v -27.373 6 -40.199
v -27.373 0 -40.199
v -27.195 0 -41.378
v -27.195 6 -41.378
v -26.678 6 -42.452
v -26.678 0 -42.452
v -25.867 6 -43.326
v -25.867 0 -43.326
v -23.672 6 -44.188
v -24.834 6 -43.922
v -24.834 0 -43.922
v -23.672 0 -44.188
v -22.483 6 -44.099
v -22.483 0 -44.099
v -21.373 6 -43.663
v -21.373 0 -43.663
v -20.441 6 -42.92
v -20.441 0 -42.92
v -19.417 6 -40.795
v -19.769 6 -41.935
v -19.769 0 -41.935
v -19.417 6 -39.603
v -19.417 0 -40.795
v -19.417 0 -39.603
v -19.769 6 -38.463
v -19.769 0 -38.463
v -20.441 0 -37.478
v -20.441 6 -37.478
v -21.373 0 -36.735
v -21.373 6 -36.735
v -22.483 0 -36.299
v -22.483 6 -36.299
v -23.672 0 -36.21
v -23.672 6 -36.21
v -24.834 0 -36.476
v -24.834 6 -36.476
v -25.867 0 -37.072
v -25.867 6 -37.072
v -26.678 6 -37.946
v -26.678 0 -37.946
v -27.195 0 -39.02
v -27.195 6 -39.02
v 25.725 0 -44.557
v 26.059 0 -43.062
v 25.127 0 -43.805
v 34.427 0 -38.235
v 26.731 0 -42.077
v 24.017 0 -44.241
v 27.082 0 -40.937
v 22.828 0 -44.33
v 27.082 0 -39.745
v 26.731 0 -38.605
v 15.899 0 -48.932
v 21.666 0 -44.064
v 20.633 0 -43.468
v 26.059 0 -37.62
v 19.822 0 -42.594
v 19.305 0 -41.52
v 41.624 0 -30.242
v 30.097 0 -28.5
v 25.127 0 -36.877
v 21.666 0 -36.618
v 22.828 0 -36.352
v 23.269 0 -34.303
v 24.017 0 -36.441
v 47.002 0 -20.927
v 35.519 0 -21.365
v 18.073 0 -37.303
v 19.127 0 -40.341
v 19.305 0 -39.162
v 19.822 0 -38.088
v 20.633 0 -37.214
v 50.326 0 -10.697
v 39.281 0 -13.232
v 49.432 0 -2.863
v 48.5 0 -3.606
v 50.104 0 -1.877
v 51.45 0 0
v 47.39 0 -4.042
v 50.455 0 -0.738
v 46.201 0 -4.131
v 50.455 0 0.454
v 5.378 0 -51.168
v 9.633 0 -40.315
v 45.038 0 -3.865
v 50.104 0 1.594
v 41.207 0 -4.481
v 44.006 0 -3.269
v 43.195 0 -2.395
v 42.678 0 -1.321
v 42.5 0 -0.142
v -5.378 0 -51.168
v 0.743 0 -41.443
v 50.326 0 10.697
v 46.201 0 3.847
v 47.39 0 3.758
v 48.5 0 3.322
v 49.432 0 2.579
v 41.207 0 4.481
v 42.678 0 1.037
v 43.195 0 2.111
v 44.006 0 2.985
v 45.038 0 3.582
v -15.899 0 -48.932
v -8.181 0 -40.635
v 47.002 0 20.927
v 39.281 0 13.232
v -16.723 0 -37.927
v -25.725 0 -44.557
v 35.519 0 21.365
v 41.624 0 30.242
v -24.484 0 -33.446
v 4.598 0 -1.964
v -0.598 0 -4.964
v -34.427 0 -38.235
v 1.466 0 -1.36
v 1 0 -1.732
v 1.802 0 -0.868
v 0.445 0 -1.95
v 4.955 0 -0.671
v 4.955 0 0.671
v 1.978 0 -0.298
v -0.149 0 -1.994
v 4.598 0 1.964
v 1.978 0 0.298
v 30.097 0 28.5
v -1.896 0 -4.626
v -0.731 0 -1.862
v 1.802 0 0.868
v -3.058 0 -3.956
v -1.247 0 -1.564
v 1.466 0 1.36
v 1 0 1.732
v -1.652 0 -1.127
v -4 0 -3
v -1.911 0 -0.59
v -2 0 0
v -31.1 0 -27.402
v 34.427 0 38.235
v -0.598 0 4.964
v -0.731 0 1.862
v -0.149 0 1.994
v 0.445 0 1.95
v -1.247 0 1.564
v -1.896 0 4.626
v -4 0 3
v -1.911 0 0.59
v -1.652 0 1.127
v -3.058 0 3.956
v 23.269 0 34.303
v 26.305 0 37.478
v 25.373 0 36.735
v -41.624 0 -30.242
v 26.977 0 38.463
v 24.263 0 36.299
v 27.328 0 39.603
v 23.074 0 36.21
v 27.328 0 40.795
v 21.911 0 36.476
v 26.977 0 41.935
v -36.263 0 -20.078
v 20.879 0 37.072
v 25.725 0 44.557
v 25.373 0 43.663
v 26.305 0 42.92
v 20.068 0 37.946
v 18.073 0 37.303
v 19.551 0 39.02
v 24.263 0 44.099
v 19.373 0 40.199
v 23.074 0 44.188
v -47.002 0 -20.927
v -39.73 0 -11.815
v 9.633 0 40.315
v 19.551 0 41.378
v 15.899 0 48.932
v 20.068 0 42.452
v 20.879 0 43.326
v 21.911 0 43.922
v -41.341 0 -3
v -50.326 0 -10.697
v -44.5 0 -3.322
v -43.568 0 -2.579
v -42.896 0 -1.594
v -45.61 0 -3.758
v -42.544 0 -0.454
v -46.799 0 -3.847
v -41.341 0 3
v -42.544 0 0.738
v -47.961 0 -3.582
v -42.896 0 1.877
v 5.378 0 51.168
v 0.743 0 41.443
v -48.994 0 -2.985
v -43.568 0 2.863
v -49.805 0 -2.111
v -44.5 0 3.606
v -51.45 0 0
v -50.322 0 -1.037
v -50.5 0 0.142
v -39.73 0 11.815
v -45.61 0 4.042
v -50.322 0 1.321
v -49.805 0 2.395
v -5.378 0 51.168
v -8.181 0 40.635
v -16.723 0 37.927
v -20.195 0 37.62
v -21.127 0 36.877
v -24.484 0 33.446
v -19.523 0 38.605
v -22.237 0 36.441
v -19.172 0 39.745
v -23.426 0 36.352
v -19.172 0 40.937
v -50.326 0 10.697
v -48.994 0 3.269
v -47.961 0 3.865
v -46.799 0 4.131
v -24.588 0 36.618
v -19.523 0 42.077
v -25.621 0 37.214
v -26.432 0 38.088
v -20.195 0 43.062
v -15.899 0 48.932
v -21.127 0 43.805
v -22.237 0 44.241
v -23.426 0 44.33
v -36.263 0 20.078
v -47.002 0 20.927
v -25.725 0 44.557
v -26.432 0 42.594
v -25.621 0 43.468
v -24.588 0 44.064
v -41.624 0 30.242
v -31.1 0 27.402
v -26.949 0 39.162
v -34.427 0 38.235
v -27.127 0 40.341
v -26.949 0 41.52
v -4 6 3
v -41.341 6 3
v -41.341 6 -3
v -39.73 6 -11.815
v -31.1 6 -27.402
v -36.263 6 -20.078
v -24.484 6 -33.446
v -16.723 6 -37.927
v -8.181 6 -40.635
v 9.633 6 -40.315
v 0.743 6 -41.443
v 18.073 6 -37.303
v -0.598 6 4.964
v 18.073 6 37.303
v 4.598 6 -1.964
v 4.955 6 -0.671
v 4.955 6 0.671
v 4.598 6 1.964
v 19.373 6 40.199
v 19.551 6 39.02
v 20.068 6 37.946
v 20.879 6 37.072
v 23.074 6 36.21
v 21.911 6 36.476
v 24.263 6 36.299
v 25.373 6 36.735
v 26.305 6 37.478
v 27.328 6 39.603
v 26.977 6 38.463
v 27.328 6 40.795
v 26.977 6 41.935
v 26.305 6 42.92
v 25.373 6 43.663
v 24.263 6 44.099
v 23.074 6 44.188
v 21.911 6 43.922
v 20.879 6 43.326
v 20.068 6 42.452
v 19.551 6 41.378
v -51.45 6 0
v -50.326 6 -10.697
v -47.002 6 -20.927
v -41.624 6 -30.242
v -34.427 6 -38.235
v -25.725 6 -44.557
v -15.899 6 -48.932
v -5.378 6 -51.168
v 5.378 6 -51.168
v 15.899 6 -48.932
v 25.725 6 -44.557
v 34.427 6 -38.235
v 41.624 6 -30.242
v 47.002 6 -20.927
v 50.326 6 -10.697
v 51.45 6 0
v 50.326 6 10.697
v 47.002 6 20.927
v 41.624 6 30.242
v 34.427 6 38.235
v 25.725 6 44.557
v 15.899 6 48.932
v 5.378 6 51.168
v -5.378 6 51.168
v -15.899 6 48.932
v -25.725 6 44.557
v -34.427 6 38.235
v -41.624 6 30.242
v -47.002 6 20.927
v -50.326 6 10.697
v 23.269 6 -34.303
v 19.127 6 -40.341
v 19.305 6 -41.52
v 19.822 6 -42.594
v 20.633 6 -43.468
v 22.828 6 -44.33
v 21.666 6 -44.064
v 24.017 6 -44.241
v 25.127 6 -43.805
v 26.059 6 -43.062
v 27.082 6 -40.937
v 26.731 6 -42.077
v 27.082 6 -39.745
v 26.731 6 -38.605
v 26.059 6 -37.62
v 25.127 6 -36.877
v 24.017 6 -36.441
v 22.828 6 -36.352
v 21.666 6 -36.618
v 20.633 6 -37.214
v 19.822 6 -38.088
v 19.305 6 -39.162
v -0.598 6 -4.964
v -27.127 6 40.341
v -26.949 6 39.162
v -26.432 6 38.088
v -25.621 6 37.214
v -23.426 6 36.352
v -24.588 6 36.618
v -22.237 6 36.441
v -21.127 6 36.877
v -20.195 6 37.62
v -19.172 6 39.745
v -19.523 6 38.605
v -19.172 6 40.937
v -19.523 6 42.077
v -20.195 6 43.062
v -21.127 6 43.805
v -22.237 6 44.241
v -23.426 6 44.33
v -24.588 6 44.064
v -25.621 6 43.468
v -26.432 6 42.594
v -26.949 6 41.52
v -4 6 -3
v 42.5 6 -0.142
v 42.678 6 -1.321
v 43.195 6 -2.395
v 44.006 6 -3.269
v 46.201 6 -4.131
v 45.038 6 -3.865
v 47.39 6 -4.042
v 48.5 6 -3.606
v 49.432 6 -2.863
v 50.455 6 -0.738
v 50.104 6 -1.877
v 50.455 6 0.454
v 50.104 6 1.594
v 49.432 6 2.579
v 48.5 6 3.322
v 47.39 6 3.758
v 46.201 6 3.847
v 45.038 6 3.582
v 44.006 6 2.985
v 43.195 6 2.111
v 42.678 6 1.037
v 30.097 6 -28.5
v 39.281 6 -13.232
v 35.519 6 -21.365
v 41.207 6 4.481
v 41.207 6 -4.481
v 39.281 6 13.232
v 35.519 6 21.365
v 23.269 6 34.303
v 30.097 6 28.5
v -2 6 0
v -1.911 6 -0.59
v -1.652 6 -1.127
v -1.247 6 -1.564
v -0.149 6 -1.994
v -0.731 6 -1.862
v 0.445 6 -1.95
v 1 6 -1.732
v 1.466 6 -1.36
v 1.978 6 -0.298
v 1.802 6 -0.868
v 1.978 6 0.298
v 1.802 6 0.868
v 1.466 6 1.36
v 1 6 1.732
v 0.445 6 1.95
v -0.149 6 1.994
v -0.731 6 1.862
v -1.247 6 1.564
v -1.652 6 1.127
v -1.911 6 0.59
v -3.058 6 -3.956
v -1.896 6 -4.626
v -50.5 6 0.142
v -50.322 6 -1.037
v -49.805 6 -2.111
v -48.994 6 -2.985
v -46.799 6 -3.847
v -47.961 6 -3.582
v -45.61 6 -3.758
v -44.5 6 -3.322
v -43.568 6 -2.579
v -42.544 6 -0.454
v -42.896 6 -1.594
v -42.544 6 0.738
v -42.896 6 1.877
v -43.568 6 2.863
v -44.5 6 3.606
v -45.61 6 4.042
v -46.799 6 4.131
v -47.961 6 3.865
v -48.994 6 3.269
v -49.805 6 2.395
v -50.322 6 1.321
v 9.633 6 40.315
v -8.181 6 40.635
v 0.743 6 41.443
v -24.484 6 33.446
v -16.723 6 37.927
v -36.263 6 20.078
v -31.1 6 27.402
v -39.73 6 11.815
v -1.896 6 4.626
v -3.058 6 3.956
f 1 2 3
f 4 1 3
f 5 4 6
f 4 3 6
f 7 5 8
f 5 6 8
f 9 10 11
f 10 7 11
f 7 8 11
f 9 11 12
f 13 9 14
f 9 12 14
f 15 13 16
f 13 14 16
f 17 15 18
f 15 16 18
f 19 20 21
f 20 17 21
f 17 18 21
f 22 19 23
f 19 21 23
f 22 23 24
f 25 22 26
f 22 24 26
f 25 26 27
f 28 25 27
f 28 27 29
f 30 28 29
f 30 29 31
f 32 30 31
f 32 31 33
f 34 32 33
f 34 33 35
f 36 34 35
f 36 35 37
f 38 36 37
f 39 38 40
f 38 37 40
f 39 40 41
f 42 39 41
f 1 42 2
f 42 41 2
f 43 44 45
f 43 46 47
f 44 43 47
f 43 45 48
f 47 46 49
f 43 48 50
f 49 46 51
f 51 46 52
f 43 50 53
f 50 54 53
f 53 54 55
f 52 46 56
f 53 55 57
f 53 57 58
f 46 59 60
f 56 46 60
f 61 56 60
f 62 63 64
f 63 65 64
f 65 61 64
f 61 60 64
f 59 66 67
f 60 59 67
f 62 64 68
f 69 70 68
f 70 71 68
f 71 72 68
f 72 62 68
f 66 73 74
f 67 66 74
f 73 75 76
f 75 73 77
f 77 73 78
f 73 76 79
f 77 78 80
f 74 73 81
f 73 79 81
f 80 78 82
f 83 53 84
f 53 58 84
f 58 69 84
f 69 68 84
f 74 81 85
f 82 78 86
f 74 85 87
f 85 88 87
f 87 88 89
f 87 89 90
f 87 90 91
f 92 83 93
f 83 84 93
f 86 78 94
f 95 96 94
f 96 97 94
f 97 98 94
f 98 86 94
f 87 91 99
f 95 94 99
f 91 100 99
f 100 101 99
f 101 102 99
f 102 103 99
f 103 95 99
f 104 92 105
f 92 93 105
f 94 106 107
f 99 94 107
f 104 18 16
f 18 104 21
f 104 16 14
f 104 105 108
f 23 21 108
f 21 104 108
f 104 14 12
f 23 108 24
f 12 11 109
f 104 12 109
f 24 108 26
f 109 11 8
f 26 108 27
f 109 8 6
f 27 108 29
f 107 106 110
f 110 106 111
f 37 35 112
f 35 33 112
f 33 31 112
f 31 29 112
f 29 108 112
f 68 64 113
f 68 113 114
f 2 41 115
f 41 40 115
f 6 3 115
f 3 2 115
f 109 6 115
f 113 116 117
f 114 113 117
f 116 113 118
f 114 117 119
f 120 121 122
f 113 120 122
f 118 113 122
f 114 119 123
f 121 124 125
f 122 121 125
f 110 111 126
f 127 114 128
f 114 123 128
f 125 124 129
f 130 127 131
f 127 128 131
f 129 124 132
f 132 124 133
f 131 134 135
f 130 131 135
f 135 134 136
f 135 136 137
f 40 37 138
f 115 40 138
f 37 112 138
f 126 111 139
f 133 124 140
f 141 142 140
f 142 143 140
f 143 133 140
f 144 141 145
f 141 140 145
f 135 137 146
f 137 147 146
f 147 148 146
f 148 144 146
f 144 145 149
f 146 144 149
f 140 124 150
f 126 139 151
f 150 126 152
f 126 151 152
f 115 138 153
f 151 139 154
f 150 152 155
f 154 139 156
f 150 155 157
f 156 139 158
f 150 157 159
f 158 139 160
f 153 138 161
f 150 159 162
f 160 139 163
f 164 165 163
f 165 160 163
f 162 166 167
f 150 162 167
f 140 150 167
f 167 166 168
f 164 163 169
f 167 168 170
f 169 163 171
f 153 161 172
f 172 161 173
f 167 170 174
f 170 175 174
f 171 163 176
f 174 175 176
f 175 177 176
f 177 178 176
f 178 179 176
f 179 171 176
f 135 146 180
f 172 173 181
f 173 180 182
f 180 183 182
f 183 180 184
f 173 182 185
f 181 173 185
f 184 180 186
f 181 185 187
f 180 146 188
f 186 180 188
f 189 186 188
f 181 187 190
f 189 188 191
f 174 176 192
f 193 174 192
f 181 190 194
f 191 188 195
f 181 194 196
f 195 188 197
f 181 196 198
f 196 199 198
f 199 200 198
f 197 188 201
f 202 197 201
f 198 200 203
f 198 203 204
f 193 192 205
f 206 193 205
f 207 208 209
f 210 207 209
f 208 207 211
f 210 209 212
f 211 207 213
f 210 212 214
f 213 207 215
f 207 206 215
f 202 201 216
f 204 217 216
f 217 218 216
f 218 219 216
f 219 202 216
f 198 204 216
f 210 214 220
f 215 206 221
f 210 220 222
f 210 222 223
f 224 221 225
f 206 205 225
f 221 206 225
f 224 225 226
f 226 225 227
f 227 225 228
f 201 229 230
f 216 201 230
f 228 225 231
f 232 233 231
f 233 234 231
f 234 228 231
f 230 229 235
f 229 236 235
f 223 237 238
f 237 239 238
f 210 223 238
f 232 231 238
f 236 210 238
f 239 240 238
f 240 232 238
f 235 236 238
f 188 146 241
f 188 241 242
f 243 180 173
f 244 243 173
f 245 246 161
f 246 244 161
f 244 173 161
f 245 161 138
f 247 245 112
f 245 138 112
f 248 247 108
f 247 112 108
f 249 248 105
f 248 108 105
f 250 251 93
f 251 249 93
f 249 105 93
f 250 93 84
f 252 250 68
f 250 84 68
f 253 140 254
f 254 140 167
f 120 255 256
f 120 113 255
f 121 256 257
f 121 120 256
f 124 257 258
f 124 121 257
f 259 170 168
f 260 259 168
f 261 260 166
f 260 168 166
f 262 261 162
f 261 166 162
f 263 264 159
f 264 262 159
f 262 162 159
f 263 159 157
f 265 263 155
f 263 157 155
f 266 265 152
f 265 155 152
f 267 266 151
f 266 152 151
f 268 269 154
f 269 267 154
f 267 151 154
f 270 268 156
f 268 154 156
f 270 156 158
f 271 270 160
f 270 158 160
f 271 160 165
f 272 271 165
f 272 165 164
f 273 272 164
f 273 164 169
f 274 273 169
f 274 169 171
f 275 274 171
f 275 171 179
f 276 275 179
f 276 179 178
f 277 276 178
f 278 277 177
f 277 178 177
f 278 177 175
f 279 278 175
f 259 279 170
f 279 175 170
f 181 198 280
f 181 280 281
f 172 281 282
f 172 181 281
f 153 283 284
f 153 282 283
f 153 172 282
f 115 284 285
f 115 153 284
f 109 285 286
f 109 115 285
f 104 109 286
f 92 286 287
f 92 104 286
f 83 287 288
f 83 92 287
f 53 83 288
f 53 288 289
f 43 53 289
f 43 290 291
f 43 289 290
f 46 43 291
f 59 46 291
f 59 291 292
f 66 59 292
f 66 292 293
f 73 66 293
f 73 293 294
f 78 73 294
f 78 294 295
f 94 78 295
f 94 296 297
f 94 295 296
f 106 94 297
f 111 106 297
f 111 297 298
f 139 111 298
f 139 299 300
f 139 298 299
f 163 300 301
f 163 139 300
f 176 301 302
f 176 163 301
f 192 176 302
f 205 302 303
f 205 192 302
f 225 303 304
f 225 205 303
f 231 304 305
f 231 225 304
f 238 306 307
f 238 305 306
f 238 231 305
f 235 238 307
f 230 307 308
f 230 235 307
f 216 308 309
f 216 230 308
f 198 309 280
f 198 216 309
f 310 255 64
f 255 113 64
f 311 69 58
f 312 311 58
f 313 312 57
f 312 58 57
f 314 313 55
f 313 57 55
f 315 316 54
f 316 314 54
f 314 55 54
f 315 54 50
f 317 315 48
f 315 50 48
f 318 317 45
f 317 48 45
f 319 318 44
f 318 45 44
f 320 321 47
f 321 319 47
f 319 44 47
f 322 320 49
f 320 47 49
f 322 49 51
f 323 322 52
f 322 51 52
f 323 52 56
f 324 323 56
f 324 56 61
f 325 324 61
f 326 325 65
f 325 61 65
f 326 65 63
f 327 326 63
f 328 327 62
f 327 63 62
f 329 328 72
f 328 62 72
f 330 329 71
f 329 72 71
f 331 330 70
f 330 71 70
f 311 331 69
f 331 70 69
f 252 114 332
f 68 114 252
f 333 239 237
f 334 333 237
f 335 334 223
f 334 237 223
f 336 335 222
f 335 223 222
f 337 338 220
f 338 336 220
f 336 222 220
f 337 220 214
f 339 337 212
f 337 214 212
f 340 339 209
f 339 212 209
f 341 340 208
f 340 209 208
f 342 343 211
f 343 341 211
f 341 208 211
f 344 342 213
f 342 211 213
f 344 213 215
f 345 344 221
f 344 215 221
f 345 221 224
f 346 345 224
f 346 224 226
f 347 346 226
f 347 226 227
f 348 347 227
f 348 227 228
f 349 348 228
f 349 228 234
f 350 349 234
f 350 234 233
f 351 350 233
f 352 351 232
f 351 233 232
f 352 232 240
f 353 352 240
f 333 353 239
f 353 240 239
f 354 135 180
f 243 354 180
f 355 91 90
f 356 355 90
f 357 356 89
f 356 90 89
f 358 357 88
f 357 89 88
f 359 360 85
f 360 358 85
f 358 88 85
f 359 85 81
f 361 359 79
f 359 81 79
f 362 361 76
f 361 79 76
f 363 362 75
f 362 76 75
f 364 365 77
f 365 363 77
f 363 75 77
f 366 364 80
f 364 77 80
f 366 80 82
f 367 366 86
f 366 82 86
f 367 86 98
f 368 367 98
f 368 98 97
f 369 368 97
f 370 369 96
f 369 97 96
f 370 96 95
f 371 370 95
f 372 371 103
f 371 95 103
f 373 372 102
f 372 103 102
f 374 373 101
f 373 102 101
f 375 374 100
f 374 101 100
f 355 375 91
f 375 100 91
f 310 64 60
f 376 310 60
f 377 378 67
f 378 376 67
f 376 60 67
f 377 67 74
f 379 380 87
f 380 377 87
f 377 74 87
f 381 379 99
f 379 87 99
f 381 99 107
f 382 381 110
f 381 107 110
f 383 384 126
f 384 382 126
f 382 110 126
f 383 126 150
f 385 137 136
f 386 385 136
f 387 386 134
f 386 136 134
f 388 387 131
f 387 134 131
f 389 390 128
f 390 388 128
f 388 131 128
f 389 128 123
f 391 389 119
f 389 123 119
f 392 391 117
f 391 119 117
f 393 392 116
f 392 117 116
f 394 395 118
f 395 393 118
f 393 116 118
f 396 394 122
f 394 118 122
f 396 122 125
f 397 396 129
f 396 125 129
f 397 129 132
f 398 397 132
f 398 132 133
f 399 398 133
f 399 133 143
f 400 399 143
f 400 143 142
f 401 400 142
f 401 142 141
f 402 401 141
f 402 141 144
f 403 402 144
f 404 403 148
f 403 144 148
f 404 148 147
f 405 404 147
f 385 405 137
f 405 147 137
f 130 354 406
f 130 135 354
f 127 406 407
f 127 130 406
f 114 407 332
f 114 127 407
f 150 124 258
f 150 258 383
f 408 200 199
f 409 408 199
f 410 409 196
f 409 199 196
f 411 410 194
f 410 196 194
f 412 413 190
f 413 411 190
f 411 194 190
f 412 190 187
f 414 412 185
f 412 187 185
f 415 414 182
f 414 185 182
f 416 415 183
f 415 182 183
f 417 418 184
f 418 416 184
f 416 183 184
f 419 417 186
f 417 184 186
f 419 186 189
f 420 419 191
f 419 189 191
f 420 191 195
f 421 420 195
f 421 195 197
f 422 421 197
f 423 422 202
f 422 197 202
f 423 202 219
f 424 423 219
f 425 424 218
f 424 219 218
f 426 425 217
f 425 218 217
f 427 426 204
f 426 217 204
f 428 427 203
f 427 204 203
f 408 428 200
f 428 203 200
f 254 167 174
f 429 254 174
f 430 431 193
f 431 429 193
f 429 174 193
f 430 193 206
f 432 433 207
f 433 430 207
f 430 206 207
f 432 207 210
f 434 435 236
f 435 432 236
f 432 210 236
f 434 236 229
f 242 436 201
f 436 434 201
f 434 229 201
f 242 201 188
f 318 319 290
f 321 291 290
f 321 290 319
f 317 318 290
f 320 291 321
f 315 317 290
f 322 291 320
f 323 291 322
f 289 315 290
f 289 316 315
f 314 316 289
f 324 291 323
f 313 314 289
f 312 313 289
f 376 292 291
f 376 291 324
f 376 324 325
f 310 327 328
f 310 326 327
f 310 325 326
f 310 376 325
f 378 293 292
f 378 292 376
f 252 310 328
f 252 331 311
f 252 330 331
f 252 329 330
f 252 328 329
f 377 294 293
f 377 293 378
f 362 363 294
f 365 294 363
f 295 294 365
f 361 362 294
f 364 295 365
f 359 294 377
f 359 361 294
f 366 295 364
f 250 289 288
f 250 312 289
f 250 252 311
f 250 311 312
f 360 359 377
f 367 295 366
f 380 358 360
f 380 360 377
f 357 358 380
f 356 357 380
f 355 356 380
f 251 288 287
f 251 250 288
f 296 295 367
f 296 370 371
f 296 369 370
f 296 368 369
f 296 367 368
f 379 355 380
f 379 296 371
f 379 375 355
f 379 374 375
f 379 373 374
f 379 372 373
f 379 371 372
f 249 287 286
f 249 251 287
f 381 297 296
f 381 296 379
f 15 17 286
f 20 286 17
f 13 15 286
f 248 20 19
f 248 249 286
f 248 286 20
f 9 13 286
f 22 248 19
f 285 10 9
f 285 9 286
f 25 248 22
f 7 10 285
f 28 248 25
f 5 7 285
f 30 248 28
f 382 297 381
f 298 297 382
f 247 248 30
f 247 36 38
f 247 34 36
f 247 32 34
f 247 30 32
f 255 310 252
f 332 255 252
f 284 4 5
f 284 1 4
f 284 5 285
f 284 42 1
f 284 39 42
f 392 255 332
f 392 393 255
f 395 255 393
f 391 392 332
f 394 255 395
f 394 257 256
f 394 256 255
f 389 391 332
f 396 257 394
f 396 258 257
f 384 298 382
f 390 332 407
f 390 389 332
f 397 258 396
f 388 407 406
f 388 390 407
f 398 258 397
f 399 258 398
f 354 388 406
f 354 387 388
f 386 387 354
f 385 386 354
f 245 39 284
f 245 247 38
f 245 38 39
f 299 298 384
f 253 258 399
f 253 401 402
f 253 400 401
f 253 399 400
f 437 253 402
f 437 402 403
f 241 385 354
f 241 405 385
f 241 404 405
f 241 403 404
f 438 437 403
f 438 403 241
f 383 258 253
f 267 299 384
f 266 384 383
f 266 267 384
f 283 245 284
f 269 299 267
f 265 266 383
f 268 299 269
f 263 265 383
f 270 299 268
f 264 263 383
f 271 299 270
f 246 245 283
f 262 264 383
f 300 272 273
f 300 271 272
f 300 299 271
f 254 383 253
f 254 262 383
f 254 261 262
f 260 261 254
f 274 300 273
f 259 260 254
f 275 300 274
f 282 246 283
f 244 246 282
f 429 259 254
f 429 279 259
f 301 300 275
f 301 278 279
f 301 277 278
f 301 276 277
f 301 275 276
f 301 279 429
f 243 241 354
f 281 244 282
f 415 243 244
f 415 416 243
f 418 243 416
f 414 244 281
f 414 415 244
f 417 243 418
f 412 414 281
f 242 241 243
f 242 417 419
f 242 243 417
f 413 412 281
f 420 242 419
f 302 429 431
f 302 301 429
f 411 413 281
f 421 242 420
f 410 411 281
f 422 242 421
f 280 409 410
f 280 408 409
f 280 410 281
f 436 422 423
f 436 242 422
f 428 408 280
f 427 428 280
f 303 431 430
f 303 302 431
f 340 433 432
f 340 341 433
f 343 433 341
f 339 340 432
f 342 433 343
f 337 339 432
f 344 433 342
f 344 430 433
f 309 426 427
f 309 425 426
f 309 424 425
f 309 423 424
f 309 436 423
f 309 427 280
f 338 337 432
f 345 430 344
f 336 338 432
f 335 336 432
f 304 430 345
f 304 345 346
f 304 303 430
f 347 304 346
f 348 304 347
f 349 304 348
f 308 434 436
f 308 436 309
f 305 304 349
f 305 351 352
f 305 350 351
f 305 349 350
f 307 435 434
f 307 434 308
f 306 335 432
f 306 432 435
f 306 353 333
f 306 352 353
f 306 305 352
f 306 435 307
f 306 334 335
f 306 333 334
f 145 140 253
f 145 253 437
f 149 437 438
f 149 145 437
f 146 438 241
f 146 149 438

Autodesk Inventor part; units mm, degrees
ref_plane "YZ Plane" through (0, 0, 0) normal (1, 0, 0) x (0, 1, 0)
ref_plane "XZ Plane" through (0, 0, 0) normal (0, 1, 0) x (-1, 0, 0)
ref_plane "XY Plane" through (0, 0, 0) normal (0, 0, 1) x (1, 0, 0)
sketch "Sketch1" plane through (0, 0, 0) normal (0, 1, 0) x (-1, 0, 0)
  circle A0 centre (0, 0) radius 51.45
  circle A1 centre (0, 0) radius 2
  line L0 (4, -3) -> (43.45, -3)
  line L1 (0.5981, 4.9641) -> (-19.1269, 39.1288)
  line L2 (-4.5981, -1.9641) -> (-24.3231, -36.1288)
  line L3 (4, 3) -> (43.45, 3)
  line L4 (-4.5981, 1.9641) -> (-24.3231, 36.1288)
  line L5 (0.5981, -4.9641) -> (-19.1269, -39.1288)
  arc A2 (4, 3) -> (0.5981, 4.9641) centre (0, 0) ccw
  arc A3 (-4.5981, 1.9641) -> (-4.5981, -1.9641) centre (0, 0) ccw
  arc A4 (0.5981, -4.9641) -> (4, -3) centre (0, 0) ccw
  arc A5 (-23.2687, 34.3026) -> (-23.2687, -34.3026) centre (0, 0) ccw
  arc A6 (-18.0726, -37.3026) -> (41.3413, -3) centre (0, 0) ccw
  arc A7 (41.3413, 3) -> (-18.0726, 37.3026) centre (0, 0) ccw
  circle A8 centre (-23.127, -40.341) radius 4
  circle A9 centre (23.3728, -40.199) radius 4
  circle A10 centre (46.4998, 0.1419) radius 4
  circle A11 centre (23.127, 40.341) radius 4
  circle A12 centre (-23.3728, 40.199) radius 4
  circle A13 centre (-46.4998, -0.1419) radius 4
  dimension "d0" = 102.9
  dimension "d2" = 4
  dimension "d7" = 360
  dimension "d9" = 6
  dimension "d12" = 360
  dimension "d16" = 8
  dimension "d17" = 46.5
  dimension "d20" = 360
extrude "Extrusion2" add sketch "Sketch1" along normal blind 6
properties part number "reaction wheel" material "PC/ABS Plastic"
